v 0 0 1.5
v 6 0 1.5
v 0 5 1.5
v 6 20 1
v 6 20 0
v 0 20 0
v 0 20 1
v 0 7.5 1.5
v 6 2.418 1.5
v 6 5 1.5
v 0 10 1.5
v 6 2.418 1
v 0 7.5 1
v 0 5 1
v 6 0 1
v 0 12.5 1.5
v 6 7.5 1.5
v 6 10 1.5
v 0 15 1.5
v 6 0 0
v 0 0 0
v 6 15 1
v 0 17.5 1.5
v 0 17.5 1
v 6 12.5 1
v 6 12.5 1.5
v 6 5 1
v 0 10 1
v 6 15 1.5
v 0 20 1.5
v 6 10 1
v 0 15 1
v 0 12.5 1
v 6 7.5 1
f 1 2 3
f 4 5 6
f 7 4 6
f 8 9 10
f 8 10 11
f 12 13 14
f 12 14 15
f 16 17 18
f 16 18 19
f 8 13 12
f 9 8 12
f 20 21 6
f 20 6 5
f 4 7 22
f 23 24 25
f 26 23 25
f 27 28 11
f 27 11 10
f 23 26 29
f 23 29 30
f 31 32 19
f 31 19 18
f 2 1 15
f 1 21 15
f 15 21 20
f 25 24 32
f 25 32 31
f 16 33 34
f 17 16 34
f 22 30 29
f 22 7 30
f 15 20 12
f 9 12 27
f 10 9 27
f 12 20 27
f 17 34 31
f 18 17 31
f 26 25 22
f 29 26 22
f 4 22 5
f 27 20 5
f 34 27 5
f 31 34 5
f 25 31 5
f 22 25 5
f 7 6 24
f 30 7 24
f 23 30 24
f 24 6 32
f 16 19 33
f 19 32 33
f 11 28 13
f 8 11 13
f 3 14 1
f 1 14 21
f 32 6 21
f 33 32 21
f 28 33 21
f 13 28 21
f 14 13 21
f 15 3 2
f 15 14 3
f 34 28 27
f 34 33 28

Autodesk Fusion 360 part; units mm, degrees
sketch "Sketch1" plane through (0, 0, 0) normal (0, 0, 1) x (1, 0, 0)
  line L0 (0, 0) -> (6, 0)
  line L1 (6, 0) -> (6, 20)
  line L2 (6, 20) -> (0, 20)
  line L3 (0, 20) -> (0, 0)
  dimension "d1" = 6
  dimension "d2" = 20
extrude "Extrude1" add sketch "Sketch1" along normal blind 1 makes body 1
sketch "Sketch2" plane through (0, 0, 1) normal (0, 0, 1) x (-1, 0, 0)
  line L0 (0, -20) -> (0, 0)
  line L1 (0, 0) -> (-6, 0)
  line L2 (-6, 0) -> (-6, -20)
  line L3 (-6, -20) -> (0, -20)
  line L4 (0, -20) -> (-6, -15)
  line L5 (0, -15) -> (-6, -10)
  line L6 (0, -10) -> (-6, -5)
  line L7 (0, -5) -> (-6, 0)
  line L8 (0, -7.5) -> (-6, -2.4178)
  line L9 (0, -12.5) -> (-6, -7.5)
  line L10 (0, -17.5) -> (-6, -12.5)
extrude "Extrude2" add sketch "Sketch2" along normal blind 0.5 contours L0 L2 L4 L10 | L0 L2 L5 L9 | L0 L2 L6 L8 | L0 L1 L7 bodies 1
copy_body "Body->Comp1" bodies 1 removing the originals makes body 2 in component "Component"
component "Component" placed x (1, 0, 0) y (0, 1, 0) z (0, 0, 1) at (0, 0, 0)
